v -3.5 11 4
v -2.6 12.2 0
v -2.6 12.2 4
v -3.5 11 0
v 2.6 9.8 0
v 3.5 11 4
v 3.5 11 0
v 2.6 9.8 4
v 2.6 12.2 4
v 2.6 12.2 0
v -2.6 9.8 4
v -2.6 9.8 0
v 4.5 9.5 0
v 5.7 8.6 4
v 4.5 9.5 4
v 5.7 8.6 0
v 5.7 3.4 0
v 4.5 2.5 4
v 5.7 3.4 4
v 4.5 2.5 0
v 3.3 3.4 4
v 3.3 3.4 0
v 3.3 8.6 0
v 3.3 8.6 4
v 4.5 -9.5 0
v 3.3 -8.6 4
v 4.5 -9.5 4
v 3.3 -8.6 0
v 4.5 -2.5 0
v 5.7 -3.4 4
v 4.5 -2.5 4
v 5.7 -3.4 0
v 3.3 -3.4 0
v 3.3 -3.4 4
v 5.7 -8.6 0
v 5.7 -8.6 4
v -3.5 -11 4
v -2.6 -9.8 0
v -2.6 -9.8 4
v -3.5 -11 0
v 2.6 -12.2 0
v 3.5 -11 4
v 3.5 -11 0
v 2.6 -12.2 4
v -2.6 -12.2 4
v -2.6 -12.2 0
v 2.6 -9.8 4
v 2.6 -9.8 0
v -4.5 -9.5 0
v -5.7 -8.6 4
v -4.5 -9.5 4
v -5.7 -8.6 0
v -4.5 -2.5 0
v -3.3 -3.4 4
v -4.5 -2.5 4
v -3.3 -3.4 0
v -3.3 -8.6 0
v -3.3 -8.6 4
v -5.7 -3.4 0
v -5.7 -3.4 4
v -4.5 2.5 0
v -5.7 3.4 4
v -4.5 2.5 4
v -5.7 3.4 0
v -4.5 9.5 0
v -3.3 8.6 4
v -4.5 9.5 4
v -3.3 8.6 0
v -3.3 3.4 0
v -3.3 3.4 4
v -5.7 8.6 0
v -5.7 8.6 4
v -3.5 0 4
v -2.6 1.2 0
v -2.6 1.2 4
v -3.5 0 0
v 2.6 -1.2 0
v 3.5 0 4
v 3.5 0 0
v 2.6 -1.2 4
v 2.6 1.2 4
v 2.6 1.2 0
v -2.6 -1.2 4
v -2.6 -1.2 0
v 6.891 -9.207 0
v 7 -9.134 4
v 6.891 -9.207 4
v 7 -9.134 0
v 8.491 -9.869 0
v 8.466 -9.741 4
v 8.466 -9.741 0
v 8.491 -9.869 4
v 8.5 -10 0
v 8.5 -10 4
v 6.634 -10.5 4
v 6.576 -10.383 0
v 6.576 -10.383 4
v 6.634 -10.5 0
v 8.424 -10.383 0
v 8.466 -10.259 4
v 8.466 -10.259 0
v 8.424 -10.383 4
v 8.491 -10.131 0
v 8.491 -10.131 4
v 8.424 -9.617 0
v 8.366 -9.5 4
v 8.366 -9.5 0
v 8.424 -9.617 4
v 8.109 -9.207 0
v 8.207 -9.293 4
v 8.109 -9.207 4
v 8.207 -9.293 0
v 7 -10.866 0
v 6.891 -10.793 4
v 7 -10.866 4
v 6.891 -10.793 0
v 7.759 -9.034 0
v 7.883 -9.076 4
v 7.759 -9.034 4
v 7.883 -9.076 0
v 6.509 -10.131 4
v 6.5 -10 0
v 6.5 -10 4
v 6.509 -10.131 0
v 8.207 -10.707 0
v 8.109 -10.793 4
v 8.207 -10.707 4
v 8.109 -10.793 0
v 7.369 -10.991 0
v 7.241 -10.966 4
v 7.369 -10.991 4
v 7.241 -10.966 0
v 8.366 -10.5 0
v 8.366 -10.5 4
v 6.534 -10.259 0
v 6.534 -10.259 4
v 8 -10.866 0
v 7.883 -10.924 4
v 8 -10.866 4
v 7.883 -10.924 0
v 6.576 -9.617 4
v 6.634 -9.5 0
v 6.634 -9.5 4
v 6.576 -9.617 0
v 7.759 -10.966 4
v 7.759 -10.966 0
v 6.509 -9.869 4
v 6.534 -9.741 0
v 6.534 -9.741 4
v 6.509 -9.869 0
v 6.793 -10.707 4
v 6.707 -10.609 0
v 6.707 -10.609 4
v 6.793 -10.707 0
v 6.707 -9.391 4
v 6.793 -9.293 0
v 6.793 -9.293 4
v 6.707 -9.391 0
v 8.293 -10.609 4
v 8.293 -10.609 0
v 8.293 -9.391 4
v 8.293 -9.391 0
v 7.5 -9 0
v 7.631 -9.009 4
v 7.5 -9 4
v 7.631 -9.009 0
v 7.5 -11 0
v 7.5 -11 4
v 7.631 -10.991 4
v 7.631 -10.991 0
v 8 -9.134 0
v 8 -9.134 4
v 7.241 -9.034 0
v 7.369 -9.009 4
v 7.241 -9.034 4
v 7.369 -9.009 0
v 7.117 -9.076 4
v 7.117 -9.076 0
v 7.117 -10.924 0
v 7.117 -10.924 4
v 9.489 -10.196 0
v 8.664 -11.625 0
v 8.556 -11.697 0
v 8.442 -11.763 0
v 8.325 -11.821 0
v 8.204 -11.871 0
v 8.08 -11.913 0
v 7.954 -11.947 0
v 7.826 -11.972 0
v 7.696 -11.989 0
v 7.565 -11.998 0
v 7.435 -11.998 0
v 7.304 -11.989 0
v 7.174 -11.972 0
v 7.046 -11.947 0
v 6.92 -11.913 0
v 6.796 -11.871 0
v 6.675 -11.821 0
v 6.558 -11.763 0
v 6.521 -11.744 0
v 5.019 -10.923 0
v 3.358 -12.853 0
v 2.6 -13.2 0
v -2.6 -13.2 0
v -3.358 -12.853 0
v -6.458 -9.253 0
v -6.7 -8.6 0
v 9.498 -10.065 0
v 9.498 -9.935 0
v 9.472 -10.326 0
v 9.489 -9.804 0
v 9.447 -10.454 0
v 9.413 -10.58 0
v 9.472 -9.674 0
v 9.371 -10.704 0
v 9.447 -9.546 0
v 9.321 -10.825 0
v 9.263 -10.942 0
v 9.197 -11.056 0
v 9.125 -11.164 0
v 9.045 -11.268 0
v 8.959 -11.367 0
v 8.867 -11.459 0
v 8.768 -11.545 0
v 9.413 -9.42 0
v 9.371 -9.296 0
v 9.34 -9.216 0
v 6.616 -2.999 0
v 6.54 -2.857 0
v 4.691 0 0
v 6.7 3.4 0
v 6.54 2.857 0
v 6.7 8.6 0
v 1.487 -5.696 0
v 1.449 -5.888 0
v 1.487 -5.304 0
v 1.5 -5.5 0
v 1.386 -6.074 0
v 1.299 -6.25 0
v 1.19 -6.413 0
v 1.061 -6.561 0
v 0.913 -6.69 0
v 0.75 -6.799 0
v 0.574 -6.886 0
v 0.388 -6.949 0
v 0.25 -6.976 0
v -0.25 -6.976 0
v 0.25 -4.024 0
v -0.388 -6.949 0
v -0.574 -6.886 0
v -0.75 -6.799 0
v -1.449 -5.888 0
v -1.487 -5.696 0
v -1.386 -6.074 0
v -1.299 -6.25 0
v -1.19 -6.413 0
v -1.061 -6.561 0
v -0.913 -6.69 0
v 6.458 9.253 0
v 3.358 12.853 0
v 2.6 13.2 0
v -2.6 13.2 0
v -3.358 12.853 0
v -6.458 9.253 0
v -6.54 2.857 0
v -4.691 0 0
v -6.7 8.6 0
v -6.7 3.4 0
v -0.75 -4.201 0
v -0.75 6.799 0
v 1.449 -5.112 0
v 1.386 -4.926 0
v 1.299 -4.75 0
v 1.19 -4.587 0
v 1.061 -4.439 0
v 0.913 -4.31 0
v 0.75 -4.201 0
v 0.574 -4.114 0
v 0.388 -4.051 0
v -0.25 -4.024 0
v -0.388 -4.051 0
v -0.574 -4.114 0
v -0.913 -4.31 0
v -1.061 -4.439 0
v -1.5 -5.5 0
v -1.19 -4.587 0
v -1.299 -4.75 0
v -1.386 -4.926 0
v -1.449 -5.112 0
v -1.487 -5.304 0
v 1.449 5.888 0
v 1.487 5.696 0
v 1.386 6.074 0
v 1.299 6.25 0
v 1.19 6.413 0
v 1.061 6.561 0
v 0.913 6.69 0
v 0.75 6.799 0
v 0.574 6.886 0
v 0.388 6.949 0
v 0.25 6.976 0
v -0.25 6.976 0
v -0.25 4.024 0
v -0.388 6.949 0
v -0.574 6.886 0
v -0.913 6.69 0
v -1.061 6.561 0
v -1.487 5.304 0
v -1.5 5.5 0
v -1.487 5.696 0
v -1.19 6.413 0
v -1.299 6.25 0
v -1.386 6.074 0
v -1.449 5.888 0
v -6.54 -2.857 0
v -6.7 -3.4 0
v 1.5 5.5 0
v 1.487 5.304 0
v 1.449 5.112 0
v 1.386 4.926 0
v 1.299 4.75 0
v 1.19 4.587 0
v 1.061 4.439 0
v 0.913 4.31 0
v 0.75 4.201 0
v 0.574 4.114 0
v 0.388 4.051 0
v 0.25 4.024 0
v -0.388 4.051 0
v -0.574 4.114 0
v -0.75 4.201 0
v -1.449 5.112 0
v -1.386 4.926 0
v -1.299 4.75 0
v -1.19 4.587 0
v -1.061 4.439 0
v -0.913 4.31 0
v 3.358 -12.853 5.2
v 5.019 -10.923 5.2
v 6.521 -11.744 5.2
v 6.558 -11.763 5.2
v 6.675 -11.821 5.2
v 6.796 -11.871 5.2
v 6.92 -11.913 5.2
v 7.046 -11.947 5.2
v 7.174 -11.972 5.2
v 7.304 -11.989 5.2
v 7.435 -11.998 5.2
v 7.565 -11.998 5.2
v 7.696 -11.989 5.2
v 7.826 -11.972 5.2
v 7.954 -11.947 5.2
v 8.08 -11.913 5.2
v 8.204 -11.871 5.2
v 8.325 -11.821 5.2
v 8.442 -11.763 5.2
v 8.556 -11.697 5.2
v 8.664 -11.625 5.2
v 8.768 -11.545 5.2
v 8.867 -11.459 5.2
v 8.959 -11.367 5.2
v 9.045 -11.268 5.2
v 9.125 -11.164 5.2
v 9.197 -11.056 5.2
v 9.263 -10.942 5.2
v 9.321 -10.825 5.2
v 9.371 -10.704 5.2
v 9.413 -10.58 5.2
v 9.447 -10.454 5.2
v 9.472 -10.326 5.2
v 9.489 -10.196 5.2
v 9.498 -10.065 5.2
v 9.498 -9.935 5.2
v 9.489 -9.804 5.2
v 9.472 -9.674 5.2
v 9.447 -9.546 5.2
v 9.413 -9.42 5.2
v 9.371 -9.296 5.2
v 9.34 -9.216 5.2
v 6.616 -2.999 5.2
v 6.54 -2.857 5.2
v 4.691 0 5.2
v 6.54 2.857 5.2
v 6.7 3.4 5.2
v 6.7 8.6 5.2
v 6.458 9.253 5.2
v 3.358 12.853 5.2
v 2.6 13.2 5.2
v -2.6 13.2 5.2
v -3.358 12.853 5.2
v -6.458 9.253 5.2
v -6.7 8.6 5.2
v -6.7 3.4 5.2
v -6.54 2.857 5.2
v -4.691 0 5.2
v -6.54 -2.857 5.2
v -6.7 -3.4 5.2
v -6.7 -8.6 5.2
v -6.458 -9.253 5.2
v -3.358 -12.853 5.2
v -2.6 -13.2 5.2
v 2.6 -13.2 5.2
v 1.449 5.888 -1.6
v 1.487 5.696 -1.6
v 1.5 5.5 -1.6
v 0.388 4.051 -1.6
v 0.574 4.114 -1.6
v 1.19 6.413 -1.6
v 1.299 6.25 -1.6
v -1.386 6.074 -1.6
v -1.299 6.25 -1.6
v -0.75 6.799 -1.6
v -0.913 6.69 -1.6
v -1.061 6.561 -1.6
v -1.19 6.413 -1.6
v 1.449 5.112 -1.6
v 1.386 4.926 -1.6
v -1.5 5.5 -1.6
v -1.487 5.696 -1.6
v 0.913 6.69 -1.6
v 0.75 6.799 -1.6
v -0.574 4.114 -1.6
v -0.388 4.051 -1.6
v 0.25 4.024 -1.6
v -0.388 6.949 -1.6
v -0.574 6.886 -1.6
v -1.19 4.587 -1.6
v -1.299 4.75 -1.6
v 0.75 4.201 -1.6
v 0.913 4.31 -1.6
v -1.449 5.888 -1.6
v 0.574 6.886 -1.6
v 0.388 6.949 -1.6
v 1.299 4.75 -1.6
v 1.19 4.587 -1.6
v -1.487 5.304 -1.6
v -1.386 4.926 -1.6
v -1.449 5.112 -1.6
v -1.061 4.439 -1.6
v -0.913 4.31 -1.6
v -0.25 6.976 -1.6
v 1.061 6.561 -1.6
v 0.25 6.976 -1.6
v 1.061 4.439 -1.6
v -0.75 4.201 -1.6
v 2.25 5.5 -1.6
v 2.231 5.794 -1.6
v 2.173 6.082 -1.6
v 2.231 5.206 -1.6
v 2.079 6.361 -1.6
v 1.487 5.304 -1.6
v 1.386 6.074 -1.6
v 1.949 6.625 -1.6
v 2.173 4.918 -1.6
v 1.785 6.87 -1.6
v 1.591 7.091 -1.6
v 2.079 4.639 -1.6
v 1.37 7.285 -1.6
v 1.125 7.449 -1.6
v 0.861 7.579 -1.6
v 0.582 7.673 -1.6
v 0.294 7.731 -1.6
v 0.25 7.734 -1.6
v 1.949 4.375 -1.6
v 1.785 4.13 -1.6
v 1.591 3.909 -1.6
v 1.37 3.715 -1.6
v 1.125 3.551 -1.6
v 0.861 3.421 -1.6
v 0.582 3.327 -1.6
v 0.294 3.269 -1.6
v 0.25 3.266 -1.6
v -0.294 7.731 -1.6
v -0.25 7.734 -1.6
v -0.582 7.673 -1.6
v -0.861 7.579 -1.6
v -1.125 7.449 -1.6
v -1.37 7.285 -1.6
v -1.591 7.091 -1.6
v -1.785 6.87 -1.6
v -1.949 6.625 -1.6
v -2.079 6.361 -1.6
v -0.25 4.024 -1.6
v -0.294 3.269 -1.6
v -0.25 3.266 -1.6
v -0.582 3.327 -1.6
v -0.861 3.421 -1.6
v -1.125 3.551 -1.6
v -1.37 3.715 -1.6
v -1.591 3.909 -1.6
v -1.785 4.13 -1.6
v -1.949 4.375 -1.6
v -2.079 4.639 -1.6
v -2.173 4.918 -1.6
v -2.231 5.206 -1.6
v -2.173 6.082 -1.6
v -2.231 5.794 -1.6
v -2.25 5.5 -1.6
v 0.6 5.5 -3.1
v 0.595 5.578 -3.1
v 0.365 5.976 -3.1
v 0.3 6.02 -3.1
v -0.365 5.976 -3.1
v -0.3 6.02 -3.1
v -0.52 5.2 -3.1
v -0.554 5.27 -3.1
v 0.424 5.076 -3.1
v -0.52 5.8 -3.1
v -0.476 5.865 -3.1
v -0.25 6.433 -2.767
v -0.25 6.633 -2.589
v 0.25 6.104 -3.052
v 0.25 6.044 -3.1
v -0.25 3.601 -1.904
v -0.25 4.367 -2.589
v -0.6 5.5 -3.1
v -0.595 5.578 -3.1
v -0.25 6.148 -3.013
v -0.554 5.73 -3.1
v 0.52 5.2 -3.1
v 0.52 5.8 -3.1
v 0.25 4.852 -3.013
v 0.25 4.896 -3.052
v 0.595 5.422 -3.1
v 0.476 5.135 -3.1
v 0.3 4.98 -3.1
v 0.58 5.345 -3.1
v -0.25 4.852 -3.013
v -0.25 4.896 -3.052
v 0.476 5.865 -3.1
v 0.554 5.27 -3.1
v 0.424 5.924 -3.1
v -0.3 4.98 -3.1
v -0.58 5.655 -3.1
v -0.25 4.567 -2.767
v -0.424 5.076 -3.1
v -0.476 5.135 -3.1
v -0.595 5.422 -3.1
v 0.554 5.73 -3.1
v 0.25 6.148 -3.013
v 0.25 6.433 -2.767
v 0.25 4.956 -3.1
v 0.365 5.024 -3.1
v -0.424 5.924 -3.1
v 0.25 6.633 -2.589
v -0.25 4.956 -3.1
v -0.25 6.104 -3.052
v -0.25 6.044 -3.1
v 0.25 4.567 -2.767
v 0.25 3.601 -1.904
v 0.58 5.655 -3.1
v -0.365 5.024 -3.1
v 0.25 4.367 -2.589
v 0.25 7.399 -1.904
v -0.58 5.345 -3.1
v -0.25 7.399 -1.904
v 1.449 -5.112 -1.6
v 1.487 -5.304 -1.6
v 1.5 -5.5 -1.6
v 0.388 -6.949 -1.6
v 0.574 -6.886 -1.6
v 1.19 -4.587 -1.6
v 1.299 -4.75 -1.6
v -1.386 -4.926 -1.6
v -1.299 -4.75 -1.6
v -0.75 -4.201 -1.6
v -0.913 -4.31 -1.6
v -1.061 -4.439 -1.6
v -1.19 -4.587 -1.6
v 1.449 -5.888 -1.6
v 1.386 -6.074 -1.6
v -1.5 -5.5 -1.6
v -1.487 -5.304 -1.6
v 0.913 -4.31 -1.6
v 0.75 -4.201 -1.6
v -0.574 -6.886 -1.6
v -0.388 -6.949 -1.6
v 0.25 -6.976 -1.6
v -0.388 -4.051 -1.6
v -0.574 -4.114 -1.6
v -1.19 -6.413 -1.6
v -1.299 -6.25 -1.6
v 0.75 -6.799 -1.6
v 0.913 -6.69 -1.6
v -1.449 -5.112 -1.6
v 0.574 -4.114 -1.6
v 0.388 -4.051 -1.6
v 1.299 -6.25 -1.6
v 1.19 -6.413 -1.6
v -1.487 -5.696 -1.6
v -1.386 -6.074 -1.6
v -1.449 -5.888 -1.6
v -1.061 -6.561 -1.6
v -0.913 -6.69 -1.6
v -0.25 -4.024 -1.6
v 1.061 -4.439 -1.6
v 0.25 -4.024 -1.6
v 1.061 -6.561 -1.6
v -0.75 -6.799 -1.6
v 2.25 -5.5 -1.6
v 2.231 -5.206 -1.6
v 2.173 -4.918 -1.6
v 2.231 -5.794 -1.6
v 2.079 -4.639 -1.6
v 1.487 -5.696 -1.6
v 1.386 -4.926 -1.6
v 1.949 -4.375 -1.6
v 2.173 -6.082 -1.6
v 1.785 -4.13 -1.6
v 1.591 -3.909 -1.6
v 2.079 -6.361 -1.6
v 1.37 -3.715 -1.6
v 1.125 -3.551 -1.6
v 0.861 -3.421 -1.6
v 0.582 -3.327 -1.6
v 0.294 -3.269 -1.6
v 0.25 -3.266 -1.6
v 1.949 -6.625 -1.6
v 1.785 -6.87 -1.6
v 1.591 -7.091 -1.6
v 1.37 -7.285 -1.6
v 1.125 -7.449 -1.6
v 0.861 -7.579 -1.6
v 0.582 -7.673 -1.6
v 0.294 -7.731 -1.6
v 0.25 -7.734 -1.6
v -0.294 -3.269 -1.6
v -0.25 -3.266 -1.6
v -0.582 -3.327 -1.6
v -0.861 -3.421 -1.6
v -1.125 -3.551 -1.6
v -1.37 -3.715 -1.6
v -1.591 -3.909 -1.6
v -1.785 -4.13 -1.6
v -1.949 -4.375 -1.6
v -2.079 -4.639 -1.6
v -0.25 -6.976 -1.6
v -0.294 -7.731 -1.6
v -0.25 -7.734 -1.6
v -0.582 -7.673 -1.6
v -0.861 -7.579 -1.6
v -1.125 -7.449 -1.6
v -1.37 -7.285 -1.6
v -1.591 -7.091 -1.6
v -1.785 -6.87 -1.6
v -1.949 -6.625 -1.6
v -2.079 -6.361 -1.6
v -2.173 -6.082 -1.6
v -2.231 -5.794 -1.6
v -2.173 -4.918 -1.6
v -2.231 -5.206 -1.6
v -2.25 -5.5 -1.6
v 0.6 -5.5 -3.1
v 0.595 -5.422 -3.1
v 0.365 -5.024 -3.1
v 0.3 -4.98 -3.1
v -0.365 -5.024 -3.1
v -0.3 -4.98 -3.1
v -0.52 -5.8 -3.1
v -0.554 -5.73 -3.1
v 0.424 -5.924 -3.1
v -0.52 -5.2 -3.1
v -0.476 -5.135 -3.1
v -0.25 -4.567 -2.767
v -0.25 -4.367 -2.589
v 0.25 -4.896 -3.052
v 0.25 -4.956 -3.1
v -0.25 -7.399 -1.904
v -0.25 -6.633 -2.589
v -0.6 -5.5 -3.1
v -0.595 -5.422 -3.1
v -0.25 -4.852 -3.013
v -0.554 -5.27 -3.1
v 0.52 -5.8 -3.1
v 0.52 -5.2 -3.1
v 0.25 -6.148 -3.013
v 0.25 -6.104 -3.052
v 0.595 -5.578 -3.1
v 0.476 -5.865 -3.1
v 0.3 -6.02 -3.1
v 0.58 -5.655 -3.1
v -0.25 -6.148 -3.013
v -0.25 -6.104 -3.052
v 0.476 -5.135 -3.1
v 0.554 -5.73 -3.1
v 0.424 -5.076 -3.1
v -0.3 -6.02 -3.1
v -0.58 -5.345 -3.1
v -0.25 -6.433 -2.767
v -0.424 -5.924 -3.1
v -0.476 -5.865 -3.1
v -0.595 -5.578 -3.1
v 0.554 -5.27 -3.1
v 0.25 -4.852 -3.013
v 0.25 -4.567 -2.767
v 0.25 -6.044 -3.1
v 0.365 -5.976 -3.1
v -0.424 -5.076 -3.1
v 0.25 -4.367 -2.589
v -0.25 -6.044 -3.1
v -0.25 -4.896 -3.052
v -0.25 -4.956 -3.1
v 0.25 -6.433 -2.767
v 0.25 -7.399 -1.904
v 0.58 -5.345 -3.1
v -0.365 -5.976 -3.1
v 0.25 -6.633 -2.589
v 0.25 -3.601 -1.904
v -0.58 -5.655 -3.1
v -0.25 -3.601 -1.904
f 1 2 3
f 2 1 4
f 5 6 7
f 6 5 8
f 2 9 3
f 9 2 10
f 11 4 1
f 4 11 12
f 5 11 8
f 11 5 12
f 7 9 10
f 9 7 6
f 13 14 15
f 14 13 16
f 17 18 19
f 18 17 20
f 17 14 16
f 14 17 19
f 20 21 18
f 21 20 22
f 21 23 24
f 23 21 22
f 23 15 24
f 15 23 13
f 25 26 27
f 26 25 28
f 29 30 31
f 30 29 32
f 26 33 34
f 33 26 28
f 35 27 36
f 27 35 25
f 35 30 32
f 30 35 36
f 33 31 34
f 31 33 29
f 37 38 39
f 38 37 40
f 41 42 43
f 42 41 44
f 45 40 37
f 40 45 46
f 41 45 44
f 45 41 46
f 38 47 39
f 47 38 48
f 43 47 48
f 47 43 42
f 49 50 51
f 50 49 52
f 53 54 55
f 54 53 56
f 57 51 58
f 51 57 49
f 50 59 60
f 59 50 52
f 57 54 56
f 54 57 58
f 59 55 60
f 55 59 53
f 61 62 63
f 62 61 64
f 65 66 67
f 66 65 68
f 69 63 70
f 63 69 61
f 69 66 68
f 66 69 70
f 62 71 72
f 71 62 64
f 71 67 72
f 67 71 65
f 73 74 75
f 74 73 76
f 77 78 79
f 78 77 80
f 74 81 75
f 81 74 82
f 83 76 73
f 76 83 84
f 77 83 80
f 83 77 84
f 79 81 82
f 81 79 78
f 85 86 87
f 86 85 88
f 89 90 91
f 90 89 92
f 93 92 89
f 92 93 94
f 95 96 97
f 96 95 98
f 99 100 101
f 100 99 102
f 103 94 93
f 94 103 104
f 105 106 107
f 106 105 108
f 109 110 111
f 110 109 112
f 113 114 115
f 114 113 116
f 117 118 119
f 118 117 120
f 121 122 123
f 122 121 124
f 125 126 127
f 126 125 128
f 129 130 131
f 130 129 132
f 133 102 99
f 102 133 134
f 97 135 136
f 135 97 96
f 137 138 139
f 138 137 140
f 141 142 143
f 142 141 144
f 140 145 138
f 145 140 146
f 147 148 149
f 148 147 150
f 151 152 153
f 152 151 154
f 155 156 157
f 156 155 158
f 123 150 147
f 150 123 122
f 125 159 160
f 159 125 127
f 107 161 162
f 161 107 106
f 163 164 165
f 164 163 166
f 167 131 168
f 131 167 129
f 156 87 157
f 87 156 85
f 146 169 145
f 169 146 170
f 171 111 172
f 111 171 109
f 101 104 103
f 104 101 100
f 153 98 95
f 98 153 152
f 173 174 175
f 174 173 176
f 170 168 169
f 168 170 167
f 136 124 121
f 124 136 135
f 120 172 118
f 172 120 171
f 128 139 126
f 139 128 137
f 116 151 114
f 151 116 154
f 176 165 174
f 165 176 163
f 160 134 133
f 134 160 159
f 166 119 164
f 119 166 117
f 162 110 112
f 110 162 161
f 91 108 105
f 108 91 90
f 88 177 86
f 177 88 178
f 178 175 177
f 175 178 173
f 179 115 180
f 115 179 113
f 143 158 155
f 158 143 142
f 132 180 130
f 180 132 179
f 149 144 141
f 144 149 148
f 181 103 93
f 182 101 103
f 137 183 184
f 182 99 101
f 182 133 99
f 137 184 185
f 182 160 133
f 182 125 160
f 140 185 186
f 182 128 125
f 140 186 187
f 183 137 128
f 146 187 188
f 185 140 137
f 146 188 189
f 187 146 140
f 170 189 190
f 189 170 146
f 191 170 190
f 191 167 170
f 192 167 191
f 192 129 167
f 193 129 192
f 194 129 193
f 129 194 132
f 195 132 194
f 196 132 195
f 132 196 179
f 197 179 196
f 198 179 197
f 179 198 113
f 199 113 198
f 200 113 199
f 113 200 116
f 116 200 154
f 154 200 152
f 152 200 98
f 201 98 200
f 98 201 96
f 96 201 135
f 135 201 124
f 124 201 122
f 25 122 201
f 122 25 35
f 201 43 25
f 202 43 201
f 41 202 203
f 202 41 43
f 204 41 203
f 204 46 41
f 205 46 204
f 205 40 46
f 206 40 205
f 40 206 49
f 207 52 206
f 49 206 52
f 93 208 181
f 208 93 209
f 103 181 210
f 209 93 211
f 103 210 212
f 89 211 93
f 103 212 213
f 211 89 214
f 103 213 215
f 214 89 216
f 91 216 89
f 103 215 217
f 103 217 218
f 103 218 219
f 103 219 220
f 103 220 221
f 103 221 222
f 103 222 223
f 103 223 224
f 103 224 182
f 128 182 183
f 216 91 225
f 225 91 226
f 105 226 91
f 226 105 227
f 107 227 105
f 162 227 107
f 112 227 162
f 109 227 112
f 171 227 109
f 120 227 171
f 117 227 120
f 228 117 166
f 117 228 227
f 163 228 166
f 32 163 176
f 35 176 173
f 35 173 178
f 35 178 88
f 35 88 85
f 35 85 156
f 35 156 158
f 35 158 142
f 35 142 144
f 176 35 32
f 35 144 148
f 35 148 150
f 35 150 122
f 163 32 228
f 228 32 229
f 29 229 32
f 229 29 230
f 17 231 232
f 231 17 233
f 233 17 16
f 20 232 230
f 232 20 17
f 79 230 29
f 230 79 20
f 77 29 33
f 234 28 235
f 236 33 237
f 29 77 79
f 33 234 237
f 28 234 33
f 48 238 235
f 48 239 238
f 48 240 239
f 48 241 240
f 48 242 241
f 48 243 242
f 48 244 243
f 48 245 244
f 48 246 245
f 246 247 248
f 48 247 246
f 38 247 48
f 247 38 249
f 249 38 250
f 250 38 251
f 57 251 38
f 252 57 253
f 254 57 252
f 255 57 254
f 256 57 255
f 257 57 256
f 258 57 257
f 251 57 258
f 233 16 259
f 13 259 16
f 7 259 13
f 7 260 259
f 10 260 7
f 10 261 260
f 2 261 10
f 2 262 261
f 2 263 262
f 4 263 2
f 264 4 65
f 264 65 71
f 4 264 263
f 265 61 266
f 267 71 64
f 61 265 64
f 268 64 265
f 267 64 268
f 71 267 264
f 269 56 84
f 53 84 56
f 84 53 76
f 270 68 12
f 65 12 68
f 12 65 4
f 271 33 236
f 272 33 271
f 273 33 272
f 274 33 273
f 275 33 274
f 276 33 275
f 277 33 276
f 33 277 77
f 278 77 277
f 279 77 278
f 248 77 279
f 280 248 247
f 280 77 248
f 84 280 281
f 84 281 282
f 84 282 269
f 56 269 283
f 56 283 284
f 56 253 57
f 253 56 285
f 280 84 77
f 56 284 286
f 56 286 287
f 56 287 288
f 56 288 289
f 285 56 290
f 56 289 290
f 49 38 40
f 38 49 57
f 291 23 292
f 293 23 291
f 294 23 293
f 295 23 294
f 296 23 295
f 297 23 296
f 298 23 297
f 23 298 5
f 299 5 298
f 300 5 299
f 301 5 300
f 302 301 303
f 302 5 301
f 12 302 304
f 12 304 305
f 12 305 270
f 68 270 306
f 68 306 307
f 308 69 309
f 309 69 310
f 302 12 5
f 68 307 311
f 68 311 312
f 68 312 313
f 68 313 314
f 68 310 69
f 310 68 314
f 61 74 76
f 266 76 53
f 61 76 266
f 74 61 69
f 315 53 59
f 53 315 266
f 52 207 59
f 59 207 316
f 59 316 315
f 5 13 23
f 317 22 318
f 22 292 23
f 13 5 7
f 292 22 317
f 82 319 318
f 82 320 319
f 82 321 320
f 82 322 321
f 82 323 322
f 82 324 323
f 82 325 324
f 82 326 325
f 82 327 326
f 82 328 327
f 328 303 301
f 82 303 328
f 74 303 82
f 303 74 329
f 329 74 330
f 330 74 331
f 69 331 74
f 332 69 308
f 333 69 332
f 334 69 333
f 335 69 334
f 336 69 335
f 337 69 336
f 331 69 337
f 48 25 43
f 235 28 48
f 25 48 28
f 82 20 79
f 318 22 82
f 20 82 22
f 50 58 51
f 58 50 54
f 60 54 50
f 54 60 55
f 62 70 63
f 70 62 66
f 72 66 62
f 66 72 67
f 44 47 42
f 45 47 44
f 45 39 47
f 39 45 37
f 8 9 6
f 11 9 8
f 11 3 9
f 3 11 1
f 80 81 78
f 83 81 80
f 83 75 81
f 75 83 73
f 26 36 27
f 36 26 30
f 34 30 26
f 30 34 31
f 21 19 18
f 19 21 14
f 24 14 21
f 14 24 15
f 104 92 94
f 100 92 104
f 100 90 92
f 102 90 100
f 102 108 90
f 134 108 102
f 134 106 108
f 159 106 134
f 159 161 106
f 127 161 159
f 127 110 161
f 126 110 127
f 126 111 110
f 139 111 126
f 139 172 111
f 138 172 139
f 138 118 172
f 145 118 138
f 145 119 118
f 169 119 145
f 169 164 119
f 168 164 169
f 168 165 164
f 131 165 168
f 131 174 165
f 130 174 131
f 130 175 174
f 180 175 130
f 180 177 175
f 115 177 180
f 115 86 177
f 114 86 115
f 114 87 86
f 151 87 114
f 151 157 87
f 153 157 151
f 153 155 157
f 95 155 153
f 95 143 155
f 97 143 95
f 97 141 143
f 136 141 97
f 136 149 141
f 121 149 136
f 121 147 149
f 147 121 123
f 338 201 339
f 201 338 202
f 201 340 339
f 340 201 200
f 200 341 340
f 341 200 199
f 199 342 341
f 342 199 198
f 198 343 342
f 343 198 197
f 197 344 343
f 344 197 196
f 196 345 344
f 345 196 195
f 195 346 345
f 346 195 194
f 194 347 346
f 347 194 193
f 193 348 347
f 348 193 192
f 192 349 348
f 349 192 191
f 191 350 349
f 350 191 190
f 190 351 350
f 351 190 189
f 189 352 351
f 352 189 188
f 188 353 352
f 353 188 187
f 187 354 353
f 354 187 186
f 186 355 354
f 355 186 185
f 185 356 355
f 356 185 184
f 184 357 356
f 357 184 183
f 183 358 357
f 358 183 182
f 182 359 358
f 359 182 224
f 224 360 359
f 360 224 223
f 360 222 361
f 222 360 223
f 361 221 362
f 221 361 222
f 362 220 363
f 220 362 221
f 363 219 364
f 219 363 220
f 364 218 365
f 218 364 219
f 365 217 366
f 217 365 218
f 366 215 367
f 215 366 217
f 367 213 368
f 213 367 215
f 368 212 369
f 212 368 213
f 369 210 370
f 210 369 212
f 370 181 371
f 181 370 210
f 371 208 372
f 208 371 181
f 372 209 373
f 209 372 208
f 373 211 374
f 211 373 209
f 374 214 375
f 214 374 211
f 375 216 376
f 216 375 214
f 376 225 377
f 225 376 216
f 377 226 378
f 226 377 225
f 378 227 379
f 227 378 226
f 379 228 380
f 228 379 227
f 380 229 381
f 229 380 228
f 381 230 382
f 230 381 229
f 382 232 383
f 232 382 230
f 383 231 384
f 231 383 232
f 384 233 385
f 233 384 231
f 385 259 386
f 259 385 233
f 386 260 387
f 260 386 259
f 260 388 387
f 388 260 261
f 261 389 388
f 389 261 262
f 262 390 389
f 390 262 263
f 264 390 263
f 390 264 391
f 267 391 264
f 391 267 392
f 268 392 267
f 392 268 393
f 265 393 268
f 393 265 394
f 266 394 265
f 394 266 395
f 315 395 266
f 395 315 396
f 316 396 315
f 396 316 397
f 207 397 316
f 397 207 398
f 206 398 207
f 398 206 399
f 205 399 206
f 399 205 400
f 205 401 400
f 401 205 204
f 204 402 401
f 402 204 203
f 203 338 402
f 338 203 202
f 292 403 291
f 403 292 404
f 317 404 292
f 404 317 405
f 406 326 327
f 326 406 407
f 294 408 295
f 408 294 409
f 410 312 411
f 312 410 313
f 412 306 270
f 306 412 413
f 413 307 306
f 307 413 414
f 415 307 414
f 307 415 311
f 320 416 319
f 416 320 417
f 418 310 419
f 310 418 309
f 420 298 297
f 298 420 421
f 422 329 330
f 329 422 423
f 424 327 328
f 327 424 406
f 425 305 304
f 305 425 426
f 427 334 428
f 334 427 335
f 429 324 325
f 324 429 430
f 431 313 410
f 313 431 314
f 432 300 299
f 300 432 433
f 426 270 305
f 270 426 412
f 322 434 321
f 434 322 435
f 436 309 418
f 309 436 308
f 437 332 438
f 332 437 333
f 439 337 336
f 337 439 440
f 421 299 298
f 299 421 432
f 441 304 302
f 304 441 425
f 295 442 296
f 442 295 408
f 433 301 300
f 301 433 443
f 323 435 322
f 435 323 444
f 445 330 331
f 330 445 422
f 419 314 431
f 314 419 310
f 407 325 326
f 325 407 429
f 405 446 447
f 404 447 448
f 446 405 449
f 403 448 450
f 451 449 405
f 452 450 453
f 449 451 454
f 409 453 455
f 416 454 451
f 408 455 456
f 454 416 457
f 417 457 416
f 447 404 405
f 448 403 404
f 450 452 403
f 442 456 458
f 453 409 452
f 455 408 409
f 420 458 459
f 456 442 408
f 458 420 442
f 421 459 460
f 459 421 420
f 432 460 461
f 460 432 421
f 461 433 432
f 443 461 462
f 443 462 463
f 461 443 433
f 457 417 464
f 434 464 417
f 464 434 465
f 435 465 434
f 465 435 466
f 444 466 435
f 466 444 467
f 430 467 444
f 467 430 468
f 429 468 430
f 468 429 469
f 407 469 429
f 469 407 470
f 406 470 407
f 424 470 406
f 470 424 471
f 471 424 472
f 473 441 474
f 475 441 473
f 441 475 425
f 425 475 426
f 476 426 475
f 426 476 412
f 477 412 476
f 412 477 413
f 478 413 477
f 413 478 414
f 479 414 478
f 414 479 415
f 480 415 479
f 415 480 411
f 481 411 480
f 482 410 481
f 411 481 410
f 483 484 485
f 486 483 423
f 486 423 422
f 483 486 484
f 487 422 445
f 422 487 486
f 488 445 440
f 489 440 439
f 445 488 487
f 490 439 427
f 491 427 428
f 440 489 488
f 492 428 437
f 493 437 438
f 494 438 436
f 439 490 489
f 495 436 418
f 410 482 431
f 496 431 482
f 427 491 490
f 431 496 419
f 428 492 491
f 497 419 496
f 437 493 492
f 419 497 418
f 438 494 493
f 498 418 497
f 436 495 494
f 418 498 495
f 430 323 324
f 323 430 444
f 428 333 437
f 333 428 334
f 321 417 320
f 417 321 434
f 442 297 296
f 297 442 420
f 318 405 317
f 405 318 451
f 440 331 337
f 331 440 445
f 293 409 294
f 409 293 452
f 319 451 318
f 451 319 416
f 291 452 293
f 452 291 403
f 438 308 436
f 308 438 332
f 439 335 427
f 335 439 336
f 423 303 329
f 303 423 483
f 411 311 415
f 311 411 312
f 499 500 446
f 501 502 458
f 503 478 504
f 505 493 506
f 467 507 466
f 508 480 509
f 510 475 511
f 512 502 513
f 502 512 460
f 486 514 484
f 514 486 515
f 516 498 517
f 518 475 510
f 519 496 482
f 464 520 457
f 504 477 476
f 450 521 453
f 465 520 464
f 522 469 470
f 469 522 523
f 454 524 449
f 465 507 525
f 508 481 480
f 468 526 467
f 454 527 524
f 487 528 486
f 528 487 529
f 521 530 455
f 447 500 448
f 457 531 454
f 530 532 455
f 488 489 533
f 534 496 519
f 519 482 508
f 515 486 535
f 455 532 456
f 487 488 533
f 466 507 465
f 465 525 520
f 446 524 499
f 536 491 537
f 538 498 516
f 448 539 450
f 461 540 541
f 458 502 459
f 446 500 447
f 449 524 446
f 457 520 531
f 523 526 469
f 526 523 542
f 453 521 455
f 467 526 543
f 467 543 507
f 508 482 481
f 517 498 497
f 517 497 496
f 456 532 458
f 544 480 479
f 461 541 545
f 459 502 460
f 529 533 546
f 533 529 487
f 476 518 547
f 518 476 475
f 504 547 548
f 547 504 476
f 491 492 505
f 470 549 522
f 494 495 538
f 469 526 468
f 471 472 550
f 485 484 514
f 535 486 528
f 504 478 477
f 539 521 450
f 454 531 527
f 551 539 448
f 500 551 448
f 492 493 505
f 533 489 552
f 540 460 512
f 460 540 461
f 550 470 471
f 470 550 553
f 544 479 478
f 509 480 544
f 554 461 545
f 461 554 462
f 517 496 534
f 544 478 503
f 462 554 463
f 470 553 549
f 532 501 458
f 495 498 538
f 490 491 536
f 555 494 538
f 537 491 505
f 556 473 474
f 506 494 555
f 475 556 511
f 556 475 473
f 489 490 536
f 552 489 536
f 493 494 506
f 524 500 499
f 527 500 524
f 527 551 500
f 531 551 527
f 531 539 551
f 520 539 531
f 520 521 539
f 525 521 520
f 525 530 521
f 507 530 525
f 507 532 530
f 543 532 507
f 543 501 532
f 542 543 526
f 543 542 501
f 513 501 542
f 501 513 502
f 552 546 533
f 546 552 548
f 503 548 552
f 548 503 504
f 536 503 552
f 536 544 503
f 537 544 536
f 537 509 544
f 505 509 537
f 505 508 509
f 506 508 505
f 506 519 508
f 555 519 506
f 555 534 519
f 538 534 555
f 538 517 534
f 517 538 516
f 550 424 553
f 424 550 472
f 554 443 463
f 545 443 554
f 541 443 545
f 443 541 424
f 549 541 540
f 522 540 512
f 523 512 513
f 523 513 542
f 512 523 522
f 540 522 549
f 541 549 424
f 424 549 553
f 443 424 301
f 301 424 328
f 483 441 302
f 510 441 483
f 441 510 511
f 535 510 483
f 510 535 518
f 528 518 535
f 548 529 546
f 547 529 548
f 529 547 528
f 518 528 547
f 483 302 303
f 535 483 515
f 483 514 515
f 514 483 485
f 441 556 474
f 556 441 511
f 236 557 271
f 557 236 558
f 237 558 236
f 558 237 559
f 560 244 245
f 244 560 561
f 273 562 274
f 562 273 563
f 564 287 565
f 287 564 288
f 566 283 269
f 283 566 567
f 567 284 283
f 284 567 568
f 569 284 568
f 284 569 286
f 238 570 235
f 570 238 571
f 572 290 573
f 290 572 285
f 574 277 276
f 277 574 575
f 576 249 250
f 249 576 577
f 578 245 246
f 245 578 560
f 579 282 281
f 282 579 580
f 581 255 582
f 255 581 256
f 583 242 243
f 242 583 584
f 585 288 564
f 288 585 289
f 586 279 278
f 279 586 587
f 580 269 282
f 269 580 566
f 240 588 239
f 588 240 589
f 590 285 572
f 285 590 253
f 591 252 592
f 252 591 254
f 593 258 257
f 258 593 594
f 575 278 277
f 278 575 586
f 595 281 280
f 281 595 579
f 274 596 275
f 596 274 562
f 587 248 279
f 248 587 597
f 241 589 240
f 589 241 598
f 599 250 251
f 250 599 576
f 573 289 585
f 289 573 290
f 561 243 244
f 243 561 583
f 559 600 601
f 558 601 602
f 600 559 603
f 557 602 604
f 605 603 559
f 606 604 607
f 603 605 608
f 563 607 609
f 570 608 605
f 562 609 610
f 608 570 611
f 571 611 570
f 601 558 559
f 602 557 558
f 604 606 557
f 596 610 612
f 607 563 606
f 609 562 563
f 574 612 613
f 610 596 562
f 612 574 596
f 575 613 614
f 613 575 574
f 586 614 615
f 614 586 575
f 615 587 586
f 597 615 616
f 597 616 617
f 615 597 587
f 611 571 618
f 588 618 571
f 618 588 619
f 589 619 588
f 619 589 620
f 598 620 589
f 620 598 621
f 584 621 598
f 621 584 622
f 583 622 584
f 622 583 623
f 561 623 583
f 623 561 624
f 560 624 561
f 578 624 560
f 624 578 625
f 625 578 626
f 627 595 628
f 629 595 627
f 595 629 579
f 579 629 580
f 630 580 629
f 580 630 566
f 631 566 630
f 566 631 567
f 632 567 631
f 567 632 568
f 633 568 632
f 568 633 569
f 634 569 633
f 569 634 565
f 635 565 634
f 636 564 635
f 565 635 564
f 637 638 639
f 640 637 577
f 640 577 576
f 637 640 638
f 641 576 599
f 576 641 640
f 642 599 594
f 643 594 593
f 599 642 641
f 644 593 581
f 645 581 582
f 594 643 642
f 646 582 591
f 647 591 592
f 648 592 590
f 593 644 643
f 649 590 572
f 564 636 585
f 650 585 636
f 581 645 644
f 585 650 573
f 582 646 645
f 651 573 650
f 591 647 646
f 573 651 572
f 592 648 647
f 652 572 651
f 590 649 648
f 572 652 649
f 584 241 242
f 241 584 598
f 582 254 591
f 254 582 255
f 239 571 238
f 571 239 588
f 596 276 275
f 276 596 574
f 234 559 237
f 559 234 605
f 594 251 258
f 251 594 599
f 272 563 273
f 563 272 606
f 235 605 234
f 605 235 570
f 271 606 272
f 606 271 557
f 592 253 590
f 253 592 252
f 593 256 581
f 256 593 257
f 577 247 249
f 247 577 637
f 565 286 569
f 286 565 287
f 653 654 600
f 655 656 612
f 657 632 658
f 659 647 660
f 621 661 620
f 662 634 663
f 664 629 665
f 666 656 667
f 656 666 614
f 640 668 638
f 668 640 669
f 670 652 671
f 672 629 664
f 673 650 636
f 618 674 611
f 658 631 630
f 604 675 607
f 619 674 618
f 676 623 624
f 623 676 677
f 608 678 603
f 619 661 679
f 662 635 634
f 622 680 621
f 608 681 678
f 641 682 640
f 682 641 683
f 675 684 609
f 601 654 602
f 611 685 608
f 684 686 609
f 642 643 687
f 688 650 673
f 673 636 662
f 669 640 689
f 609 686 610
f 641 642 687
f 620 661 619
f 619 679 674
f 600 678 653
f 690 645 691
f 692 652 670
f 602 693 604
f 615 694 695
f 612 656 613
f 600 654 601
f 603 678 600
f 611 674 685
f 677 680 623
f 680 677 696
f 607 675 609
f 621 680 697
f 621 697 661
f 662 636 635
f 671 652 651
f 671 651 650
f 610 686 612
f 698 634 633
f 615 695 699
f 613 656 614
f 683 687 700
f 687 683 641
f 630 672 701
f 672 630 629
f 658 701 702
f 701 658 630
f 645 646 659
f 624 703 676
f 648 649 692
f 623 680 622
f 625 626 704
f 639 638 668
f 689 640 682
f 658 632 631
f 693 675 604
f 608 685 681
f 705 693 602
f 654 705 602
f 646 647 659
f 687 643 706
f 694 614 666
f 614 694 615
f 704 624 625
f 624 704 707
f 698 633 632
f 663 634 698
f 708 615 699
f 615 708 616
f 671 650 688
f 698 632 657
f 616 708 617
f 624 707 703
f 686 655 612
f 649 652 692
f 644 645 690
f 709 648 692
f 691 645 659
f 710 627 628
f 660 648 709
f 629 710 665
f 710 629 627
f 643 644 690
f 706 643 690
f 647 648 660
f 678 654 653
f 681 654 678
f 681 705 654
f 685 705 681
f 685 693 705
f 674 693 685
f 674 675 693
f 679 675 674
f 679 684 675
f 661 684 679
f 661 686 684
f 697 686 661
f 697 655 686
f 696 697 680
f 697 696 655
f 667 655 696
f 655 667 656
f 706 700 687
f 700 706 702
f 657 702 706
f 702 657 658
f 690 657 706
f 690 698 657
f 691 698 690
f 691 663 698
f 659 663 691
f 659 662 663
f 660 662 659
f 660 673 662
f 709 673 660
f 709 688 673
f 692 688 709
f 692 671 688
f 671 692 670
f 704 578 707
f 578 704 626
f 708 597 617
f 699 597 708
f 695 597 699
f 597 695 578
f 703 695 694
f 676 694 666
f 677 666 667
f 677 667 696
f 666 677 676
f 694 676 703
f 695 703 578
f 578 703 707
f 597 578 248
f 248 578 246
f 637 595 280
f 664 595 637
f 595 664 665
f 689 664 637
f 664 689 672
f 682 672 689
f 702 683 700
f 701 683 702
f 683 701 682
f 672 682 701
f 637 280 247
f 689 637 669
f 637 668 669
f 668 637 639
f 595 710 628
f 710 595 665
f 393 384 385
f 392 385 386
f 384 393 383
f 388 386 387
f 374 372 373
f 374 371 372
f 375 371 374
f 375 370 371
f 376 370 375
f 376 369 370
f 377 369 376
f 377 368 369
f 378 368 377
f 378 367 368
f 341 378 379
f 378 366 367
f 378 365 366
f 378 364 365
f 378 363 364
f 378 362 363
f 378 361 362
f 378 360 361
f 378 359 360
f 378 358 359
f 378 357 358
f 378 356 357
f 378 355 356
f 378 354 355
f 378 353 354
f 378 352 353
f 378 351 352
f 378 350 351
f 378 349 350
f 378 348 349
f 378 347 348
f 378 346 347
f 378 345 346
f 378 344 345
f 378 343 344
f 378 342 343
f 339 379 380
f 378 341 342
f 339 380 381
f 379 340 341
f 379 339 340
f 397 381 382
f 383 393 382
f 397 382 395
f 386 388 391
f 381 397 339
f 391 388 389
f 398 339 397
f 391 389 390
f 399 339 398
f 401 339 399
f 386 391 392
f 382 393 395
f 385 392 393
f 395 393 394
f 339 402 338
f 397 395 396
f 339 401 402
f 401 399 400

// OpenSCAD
// =============================================================================
// mini7seg_diffuser_v3.scad
// Iteration 3: hex pockets all the way through + clips printed as part of the
// baffle's opaque material (no separate clip parts).
//
// Differences from v2:
//   1. Hex segment pockets and the DP pocket now go through the FULL baffle
//      thickness (no solid base under the LEDs). Each tube is a clear column
//      from the PCB up to the baffle's top face — light from each WS2812 is
//      free to leave its tube and hit the diffuser without bleeding sideways.
//   2. Mounting clips are now integral with the baffle. Each mount position
//      grows a "down peg" out of the baffle's silhouette body — extending
//      below the baffle, through the PCB hole, ending in a 4-finger splayed
//      barb that locks against the PCB underside.
//      Diffuser is NOT peg-mounted; it sits on the baffle's top face and is
//      held by friction / glue / a future rim-clip iteration.
//   3. The thin extra "base layer" idea from v2 is gone — the silhouette body
//      is now a single solid extrusion with the pockets carved through it.
//      The mount-hole XY positions are deliberately NOT cut, so they remain
//      solid baffle material out of which the integral pegs grow.
// =============================================================================


// ---------- BOARD ----------
board_w        = 20.2;
board_h        = 34.3;
pcb_thickness  = 1.6;

header_zone_top = 4.0;
header_zone_bot = 4.0;

// Mounting positions on the PCB. NOT subtracted from the baffle — instead the
// integral pegs grow from these positions.
mount_hole_d        = 3.2;
mount_hole_y_top    =  5.5;
mount_hole_y_bot    = -5.5;


// ---------- SEGMENT GEOMETRY ----------
seg_length  = 7.0;
seg_width   = 2.4;
seg_chamfer = 0.9;


// ---------- DIGIT LAYOUT ----------
seg_A = [ 0,    11.0,   0];
seg_B = [ 4.5,  6.0,   90];
seg_C = [ 4.5, -6.0,   90];
seg_D = [ 0,   -11.0,   0];
seg_E = [-4.5, -6.0,   90];
seg_F = [-4.5,  6.0,   90];
seg_G = [ 0,    0.0,    0];

dp_pos = [ 7.5, -10.0];
dp_d   = 2.0;


// ---------- LAYER STACK ----------
baffle_thickness   = 4.0;
diffuser_thickness = 1.2;
silhouette_margin  = 1.0;


// ---------- INTEGRAL CLIP / PEG ----------
// Stem fits through the 3.2 mm mount hole with a small slip clearance.
peg_stem_d         = mount_hole_d - 0.2;     // 3.0 mm
peg_barb_max_d     = 4.5;                    // splayed barb diameter (must exceed mount_hole_d)
peg_barb_h         = 1.5;                    // barb cone height
peg_barb_tip_d     = peg_stem_d * 0.4;       // narrow end of barb cone
peg_slit_w         = 0.5;                    // compressibility slit width (printable minimum)
peg_slit_into_stem = 1.0;                    // slit extends this far up into the stem


// ---------- RENDER MODE ----------
// One of: "baffle", "diffuser", "preview"
mode = "preview";


// =============================================================================
// 2D PRIMITIVES
// =============================================================================

module hex_bar_2d(length, width, chamfer) {
    polygon(points = [
        [-length/2 + chamfer, -width/2],
        [ length/2 - chamfer, -width/2],
        [ length/2,            0      ],
        [ length/2 - chamfer,  width/2],
        [-length/2 + chamfer,  width/2],
        [-length/2,            0      ],
    ]);
}

module hex_bar_at(seg) {
    translate([seg[0], seg[1]])
        rotate(seg[2])
            hex_bar_2d(seg_length, seg_width, seg_chamfer);
}

module digit_silhouette() {
    offset(r = silhouette_margin) {
        union() {
            hull() {
                hex_bar_at(seg_A);
                hex_bar_at(seg_F);
                hex_bar_at(seg_B);
                hex_bar_at(seg_G);
            }
            hull() {
                hex_bar_at(seg_G);
                hex_bar_at(seg_E);
                hex_bar_at(seg_C);
                hex_bar_at(seg_D);
            }
            hull() {
                hex_bar_at(seg_C);
                translate(dp_pos)
                    circle(d = dp_d, $fn = 48);
            }
        }
    }
}


// =============================================================================
// 3D HELPERS
// =============================================================================

module hex_pocket_3d(seg, h) {
    translate([seg[0], seg[1], 0])
        rotate([0, 0, seg[2]])
            linear_extrude(height = h)
                hex_bar_2d(seg_length, seg_width, seg_chamfer);
}

module dp_pocket_3d(h) {
    translate([dp_pos[0], dp_pos[1], 0])
        cylinder(d = dp_d, h = h, $fn = 48);
}

module mounting_hole_3d(y, h) {
    translate([0, y, 0])
        cylinder(d = mount_hole_d, h = h, $fn = 48);
}

// One barb cone (frustum). Plain solid — slot is cut at the peg level so it
// can run continuously through both shaft and barb.
//   wide_at_bottom = true  → cone is wide at z=0, tapers up to a tip
//   wide_at_bottom = false → cone is narrow at z=0, widens up to z=h
module barb_cone(wide_at_bottom) {
    d_lo = wide_at_bottom ? peg_barb_max_d : peg_barb_tip_d;
    d_hi = wide_at_bottom ? peg_barb_tip_d : peg_barb_max_d;
    cylinder(d1 = d_lo, d2 = d_hi, h = peg_barb_h, $fn = 48);
}

// Integral peg at the given Y position. Grows DOWN from the baffle's
// underside, through the PCB hole, ending in a 4-finger... actually no — a
// TWO-LEGGED barb. A single 0.5 mm slot is cut all the way through the shaft
// and the barb, splitting the peg into two half-cylinders that flex toward
// each other when squeezed through the mount hole. The shaft itself
// contributes most of the bending compliance; the two half-cone barb
// segments flare back out below the PCB to lock.
module integral_peg(y) {
    translate([0, y, 0]) {
        difference() {
            union() {
                // stem through PCB hole
                translate([0, 0, -pcb_thickness])
                    cylinder(d = peg_stem_d, h = pcb_thickness, $fn = 48);
                // splayed barb at the tip
                translate([0, 0, -pcb_thickness - peg_barb_h])
                    barb_cone(false);
            }
            // Single full-length slot. Cuts straight through both halves of
            // the shaft and barb, from the barb's tip up to the baffle's
            // underside. The two resulting legs flex toward each other on
            // insertion and spring back below the PCB.
            translate([-peg_slit_w/2,
                       -peg_barb_max_d,
                       -pcb_thickness - peg_barb_h])
                cube([peg_slit_w,
                      2 * peg_barb_max_d,
                      peg_barb_h + pcb_thickness]);
        }
    }
}


// =============================================================================
// PARTS
// =============================================================================

module baffle_v3() {
    // Single solid extrusion of the digit silhouette, with hex pockets and DP
    // cut FULL DEPTH so each LED has a clear column to the diffuser. Mount-hole
    // positions are intentionally not cut — they remain solid material from
    // which the integral pegs grow.
    difference() {
        linear_extrude(height = baffle_thickness)
            digit_silhouette();
        translate([0, 0, -0.05]) {
            hex_pocket_3d(seg_A, baffle_thickness + 0.1);
            hex_pocket_3d(seg_B, baffle_thickness + 0.1);
            hex_pocket_3d(seg_C, baffle_thickness + 0.1);
            hex_pocket_3d(seg_D, baffle_thickness + 0.1);
            hex_pocket_3d(seg_E, baffle_thickness + 0.1);
            hex_pocket_3d(seg_F, baffle_thickness + 0.1);
            hex_pocket_3d(seg_G, baffle_thickness + 0.1);
            dp_pocket_3d(baffle_thickness + 0.1);
        }
    }

    // Integral pegs at both mount positions — printed as part of this same part.
    integral_peg(mount_hole_y_top);
    integral_peg(mount_hole_y_bot);
}

module diffuser_v3() {
    // Plain digit-silhouette lid. No mount holes — nothing pokes through it
    // from the baffle. Sits on the baffle's top face by friction (or future
    // attachment scheme: rim clip, glue dot, etc.).
    linear_extrude(height = diffuser_thickness)
        digit_silhouette();
}


// =============================================================================
// RENDER
// =============================================================================

if (mode == "baffle") {
    baffle_v3();
} else if (mode == "diffuser") {
    diffuser_v3();
} else {
    // preview: assembled stack — baffle (with integral pegs visible above
    // and below) + translucent diffuser sitting on top of the baffle.
    baffle_v3();
    color([1, 1, 1, 0.35])
        translate([0, 0, baffle_thickness])
            diffuser_v3();
}
